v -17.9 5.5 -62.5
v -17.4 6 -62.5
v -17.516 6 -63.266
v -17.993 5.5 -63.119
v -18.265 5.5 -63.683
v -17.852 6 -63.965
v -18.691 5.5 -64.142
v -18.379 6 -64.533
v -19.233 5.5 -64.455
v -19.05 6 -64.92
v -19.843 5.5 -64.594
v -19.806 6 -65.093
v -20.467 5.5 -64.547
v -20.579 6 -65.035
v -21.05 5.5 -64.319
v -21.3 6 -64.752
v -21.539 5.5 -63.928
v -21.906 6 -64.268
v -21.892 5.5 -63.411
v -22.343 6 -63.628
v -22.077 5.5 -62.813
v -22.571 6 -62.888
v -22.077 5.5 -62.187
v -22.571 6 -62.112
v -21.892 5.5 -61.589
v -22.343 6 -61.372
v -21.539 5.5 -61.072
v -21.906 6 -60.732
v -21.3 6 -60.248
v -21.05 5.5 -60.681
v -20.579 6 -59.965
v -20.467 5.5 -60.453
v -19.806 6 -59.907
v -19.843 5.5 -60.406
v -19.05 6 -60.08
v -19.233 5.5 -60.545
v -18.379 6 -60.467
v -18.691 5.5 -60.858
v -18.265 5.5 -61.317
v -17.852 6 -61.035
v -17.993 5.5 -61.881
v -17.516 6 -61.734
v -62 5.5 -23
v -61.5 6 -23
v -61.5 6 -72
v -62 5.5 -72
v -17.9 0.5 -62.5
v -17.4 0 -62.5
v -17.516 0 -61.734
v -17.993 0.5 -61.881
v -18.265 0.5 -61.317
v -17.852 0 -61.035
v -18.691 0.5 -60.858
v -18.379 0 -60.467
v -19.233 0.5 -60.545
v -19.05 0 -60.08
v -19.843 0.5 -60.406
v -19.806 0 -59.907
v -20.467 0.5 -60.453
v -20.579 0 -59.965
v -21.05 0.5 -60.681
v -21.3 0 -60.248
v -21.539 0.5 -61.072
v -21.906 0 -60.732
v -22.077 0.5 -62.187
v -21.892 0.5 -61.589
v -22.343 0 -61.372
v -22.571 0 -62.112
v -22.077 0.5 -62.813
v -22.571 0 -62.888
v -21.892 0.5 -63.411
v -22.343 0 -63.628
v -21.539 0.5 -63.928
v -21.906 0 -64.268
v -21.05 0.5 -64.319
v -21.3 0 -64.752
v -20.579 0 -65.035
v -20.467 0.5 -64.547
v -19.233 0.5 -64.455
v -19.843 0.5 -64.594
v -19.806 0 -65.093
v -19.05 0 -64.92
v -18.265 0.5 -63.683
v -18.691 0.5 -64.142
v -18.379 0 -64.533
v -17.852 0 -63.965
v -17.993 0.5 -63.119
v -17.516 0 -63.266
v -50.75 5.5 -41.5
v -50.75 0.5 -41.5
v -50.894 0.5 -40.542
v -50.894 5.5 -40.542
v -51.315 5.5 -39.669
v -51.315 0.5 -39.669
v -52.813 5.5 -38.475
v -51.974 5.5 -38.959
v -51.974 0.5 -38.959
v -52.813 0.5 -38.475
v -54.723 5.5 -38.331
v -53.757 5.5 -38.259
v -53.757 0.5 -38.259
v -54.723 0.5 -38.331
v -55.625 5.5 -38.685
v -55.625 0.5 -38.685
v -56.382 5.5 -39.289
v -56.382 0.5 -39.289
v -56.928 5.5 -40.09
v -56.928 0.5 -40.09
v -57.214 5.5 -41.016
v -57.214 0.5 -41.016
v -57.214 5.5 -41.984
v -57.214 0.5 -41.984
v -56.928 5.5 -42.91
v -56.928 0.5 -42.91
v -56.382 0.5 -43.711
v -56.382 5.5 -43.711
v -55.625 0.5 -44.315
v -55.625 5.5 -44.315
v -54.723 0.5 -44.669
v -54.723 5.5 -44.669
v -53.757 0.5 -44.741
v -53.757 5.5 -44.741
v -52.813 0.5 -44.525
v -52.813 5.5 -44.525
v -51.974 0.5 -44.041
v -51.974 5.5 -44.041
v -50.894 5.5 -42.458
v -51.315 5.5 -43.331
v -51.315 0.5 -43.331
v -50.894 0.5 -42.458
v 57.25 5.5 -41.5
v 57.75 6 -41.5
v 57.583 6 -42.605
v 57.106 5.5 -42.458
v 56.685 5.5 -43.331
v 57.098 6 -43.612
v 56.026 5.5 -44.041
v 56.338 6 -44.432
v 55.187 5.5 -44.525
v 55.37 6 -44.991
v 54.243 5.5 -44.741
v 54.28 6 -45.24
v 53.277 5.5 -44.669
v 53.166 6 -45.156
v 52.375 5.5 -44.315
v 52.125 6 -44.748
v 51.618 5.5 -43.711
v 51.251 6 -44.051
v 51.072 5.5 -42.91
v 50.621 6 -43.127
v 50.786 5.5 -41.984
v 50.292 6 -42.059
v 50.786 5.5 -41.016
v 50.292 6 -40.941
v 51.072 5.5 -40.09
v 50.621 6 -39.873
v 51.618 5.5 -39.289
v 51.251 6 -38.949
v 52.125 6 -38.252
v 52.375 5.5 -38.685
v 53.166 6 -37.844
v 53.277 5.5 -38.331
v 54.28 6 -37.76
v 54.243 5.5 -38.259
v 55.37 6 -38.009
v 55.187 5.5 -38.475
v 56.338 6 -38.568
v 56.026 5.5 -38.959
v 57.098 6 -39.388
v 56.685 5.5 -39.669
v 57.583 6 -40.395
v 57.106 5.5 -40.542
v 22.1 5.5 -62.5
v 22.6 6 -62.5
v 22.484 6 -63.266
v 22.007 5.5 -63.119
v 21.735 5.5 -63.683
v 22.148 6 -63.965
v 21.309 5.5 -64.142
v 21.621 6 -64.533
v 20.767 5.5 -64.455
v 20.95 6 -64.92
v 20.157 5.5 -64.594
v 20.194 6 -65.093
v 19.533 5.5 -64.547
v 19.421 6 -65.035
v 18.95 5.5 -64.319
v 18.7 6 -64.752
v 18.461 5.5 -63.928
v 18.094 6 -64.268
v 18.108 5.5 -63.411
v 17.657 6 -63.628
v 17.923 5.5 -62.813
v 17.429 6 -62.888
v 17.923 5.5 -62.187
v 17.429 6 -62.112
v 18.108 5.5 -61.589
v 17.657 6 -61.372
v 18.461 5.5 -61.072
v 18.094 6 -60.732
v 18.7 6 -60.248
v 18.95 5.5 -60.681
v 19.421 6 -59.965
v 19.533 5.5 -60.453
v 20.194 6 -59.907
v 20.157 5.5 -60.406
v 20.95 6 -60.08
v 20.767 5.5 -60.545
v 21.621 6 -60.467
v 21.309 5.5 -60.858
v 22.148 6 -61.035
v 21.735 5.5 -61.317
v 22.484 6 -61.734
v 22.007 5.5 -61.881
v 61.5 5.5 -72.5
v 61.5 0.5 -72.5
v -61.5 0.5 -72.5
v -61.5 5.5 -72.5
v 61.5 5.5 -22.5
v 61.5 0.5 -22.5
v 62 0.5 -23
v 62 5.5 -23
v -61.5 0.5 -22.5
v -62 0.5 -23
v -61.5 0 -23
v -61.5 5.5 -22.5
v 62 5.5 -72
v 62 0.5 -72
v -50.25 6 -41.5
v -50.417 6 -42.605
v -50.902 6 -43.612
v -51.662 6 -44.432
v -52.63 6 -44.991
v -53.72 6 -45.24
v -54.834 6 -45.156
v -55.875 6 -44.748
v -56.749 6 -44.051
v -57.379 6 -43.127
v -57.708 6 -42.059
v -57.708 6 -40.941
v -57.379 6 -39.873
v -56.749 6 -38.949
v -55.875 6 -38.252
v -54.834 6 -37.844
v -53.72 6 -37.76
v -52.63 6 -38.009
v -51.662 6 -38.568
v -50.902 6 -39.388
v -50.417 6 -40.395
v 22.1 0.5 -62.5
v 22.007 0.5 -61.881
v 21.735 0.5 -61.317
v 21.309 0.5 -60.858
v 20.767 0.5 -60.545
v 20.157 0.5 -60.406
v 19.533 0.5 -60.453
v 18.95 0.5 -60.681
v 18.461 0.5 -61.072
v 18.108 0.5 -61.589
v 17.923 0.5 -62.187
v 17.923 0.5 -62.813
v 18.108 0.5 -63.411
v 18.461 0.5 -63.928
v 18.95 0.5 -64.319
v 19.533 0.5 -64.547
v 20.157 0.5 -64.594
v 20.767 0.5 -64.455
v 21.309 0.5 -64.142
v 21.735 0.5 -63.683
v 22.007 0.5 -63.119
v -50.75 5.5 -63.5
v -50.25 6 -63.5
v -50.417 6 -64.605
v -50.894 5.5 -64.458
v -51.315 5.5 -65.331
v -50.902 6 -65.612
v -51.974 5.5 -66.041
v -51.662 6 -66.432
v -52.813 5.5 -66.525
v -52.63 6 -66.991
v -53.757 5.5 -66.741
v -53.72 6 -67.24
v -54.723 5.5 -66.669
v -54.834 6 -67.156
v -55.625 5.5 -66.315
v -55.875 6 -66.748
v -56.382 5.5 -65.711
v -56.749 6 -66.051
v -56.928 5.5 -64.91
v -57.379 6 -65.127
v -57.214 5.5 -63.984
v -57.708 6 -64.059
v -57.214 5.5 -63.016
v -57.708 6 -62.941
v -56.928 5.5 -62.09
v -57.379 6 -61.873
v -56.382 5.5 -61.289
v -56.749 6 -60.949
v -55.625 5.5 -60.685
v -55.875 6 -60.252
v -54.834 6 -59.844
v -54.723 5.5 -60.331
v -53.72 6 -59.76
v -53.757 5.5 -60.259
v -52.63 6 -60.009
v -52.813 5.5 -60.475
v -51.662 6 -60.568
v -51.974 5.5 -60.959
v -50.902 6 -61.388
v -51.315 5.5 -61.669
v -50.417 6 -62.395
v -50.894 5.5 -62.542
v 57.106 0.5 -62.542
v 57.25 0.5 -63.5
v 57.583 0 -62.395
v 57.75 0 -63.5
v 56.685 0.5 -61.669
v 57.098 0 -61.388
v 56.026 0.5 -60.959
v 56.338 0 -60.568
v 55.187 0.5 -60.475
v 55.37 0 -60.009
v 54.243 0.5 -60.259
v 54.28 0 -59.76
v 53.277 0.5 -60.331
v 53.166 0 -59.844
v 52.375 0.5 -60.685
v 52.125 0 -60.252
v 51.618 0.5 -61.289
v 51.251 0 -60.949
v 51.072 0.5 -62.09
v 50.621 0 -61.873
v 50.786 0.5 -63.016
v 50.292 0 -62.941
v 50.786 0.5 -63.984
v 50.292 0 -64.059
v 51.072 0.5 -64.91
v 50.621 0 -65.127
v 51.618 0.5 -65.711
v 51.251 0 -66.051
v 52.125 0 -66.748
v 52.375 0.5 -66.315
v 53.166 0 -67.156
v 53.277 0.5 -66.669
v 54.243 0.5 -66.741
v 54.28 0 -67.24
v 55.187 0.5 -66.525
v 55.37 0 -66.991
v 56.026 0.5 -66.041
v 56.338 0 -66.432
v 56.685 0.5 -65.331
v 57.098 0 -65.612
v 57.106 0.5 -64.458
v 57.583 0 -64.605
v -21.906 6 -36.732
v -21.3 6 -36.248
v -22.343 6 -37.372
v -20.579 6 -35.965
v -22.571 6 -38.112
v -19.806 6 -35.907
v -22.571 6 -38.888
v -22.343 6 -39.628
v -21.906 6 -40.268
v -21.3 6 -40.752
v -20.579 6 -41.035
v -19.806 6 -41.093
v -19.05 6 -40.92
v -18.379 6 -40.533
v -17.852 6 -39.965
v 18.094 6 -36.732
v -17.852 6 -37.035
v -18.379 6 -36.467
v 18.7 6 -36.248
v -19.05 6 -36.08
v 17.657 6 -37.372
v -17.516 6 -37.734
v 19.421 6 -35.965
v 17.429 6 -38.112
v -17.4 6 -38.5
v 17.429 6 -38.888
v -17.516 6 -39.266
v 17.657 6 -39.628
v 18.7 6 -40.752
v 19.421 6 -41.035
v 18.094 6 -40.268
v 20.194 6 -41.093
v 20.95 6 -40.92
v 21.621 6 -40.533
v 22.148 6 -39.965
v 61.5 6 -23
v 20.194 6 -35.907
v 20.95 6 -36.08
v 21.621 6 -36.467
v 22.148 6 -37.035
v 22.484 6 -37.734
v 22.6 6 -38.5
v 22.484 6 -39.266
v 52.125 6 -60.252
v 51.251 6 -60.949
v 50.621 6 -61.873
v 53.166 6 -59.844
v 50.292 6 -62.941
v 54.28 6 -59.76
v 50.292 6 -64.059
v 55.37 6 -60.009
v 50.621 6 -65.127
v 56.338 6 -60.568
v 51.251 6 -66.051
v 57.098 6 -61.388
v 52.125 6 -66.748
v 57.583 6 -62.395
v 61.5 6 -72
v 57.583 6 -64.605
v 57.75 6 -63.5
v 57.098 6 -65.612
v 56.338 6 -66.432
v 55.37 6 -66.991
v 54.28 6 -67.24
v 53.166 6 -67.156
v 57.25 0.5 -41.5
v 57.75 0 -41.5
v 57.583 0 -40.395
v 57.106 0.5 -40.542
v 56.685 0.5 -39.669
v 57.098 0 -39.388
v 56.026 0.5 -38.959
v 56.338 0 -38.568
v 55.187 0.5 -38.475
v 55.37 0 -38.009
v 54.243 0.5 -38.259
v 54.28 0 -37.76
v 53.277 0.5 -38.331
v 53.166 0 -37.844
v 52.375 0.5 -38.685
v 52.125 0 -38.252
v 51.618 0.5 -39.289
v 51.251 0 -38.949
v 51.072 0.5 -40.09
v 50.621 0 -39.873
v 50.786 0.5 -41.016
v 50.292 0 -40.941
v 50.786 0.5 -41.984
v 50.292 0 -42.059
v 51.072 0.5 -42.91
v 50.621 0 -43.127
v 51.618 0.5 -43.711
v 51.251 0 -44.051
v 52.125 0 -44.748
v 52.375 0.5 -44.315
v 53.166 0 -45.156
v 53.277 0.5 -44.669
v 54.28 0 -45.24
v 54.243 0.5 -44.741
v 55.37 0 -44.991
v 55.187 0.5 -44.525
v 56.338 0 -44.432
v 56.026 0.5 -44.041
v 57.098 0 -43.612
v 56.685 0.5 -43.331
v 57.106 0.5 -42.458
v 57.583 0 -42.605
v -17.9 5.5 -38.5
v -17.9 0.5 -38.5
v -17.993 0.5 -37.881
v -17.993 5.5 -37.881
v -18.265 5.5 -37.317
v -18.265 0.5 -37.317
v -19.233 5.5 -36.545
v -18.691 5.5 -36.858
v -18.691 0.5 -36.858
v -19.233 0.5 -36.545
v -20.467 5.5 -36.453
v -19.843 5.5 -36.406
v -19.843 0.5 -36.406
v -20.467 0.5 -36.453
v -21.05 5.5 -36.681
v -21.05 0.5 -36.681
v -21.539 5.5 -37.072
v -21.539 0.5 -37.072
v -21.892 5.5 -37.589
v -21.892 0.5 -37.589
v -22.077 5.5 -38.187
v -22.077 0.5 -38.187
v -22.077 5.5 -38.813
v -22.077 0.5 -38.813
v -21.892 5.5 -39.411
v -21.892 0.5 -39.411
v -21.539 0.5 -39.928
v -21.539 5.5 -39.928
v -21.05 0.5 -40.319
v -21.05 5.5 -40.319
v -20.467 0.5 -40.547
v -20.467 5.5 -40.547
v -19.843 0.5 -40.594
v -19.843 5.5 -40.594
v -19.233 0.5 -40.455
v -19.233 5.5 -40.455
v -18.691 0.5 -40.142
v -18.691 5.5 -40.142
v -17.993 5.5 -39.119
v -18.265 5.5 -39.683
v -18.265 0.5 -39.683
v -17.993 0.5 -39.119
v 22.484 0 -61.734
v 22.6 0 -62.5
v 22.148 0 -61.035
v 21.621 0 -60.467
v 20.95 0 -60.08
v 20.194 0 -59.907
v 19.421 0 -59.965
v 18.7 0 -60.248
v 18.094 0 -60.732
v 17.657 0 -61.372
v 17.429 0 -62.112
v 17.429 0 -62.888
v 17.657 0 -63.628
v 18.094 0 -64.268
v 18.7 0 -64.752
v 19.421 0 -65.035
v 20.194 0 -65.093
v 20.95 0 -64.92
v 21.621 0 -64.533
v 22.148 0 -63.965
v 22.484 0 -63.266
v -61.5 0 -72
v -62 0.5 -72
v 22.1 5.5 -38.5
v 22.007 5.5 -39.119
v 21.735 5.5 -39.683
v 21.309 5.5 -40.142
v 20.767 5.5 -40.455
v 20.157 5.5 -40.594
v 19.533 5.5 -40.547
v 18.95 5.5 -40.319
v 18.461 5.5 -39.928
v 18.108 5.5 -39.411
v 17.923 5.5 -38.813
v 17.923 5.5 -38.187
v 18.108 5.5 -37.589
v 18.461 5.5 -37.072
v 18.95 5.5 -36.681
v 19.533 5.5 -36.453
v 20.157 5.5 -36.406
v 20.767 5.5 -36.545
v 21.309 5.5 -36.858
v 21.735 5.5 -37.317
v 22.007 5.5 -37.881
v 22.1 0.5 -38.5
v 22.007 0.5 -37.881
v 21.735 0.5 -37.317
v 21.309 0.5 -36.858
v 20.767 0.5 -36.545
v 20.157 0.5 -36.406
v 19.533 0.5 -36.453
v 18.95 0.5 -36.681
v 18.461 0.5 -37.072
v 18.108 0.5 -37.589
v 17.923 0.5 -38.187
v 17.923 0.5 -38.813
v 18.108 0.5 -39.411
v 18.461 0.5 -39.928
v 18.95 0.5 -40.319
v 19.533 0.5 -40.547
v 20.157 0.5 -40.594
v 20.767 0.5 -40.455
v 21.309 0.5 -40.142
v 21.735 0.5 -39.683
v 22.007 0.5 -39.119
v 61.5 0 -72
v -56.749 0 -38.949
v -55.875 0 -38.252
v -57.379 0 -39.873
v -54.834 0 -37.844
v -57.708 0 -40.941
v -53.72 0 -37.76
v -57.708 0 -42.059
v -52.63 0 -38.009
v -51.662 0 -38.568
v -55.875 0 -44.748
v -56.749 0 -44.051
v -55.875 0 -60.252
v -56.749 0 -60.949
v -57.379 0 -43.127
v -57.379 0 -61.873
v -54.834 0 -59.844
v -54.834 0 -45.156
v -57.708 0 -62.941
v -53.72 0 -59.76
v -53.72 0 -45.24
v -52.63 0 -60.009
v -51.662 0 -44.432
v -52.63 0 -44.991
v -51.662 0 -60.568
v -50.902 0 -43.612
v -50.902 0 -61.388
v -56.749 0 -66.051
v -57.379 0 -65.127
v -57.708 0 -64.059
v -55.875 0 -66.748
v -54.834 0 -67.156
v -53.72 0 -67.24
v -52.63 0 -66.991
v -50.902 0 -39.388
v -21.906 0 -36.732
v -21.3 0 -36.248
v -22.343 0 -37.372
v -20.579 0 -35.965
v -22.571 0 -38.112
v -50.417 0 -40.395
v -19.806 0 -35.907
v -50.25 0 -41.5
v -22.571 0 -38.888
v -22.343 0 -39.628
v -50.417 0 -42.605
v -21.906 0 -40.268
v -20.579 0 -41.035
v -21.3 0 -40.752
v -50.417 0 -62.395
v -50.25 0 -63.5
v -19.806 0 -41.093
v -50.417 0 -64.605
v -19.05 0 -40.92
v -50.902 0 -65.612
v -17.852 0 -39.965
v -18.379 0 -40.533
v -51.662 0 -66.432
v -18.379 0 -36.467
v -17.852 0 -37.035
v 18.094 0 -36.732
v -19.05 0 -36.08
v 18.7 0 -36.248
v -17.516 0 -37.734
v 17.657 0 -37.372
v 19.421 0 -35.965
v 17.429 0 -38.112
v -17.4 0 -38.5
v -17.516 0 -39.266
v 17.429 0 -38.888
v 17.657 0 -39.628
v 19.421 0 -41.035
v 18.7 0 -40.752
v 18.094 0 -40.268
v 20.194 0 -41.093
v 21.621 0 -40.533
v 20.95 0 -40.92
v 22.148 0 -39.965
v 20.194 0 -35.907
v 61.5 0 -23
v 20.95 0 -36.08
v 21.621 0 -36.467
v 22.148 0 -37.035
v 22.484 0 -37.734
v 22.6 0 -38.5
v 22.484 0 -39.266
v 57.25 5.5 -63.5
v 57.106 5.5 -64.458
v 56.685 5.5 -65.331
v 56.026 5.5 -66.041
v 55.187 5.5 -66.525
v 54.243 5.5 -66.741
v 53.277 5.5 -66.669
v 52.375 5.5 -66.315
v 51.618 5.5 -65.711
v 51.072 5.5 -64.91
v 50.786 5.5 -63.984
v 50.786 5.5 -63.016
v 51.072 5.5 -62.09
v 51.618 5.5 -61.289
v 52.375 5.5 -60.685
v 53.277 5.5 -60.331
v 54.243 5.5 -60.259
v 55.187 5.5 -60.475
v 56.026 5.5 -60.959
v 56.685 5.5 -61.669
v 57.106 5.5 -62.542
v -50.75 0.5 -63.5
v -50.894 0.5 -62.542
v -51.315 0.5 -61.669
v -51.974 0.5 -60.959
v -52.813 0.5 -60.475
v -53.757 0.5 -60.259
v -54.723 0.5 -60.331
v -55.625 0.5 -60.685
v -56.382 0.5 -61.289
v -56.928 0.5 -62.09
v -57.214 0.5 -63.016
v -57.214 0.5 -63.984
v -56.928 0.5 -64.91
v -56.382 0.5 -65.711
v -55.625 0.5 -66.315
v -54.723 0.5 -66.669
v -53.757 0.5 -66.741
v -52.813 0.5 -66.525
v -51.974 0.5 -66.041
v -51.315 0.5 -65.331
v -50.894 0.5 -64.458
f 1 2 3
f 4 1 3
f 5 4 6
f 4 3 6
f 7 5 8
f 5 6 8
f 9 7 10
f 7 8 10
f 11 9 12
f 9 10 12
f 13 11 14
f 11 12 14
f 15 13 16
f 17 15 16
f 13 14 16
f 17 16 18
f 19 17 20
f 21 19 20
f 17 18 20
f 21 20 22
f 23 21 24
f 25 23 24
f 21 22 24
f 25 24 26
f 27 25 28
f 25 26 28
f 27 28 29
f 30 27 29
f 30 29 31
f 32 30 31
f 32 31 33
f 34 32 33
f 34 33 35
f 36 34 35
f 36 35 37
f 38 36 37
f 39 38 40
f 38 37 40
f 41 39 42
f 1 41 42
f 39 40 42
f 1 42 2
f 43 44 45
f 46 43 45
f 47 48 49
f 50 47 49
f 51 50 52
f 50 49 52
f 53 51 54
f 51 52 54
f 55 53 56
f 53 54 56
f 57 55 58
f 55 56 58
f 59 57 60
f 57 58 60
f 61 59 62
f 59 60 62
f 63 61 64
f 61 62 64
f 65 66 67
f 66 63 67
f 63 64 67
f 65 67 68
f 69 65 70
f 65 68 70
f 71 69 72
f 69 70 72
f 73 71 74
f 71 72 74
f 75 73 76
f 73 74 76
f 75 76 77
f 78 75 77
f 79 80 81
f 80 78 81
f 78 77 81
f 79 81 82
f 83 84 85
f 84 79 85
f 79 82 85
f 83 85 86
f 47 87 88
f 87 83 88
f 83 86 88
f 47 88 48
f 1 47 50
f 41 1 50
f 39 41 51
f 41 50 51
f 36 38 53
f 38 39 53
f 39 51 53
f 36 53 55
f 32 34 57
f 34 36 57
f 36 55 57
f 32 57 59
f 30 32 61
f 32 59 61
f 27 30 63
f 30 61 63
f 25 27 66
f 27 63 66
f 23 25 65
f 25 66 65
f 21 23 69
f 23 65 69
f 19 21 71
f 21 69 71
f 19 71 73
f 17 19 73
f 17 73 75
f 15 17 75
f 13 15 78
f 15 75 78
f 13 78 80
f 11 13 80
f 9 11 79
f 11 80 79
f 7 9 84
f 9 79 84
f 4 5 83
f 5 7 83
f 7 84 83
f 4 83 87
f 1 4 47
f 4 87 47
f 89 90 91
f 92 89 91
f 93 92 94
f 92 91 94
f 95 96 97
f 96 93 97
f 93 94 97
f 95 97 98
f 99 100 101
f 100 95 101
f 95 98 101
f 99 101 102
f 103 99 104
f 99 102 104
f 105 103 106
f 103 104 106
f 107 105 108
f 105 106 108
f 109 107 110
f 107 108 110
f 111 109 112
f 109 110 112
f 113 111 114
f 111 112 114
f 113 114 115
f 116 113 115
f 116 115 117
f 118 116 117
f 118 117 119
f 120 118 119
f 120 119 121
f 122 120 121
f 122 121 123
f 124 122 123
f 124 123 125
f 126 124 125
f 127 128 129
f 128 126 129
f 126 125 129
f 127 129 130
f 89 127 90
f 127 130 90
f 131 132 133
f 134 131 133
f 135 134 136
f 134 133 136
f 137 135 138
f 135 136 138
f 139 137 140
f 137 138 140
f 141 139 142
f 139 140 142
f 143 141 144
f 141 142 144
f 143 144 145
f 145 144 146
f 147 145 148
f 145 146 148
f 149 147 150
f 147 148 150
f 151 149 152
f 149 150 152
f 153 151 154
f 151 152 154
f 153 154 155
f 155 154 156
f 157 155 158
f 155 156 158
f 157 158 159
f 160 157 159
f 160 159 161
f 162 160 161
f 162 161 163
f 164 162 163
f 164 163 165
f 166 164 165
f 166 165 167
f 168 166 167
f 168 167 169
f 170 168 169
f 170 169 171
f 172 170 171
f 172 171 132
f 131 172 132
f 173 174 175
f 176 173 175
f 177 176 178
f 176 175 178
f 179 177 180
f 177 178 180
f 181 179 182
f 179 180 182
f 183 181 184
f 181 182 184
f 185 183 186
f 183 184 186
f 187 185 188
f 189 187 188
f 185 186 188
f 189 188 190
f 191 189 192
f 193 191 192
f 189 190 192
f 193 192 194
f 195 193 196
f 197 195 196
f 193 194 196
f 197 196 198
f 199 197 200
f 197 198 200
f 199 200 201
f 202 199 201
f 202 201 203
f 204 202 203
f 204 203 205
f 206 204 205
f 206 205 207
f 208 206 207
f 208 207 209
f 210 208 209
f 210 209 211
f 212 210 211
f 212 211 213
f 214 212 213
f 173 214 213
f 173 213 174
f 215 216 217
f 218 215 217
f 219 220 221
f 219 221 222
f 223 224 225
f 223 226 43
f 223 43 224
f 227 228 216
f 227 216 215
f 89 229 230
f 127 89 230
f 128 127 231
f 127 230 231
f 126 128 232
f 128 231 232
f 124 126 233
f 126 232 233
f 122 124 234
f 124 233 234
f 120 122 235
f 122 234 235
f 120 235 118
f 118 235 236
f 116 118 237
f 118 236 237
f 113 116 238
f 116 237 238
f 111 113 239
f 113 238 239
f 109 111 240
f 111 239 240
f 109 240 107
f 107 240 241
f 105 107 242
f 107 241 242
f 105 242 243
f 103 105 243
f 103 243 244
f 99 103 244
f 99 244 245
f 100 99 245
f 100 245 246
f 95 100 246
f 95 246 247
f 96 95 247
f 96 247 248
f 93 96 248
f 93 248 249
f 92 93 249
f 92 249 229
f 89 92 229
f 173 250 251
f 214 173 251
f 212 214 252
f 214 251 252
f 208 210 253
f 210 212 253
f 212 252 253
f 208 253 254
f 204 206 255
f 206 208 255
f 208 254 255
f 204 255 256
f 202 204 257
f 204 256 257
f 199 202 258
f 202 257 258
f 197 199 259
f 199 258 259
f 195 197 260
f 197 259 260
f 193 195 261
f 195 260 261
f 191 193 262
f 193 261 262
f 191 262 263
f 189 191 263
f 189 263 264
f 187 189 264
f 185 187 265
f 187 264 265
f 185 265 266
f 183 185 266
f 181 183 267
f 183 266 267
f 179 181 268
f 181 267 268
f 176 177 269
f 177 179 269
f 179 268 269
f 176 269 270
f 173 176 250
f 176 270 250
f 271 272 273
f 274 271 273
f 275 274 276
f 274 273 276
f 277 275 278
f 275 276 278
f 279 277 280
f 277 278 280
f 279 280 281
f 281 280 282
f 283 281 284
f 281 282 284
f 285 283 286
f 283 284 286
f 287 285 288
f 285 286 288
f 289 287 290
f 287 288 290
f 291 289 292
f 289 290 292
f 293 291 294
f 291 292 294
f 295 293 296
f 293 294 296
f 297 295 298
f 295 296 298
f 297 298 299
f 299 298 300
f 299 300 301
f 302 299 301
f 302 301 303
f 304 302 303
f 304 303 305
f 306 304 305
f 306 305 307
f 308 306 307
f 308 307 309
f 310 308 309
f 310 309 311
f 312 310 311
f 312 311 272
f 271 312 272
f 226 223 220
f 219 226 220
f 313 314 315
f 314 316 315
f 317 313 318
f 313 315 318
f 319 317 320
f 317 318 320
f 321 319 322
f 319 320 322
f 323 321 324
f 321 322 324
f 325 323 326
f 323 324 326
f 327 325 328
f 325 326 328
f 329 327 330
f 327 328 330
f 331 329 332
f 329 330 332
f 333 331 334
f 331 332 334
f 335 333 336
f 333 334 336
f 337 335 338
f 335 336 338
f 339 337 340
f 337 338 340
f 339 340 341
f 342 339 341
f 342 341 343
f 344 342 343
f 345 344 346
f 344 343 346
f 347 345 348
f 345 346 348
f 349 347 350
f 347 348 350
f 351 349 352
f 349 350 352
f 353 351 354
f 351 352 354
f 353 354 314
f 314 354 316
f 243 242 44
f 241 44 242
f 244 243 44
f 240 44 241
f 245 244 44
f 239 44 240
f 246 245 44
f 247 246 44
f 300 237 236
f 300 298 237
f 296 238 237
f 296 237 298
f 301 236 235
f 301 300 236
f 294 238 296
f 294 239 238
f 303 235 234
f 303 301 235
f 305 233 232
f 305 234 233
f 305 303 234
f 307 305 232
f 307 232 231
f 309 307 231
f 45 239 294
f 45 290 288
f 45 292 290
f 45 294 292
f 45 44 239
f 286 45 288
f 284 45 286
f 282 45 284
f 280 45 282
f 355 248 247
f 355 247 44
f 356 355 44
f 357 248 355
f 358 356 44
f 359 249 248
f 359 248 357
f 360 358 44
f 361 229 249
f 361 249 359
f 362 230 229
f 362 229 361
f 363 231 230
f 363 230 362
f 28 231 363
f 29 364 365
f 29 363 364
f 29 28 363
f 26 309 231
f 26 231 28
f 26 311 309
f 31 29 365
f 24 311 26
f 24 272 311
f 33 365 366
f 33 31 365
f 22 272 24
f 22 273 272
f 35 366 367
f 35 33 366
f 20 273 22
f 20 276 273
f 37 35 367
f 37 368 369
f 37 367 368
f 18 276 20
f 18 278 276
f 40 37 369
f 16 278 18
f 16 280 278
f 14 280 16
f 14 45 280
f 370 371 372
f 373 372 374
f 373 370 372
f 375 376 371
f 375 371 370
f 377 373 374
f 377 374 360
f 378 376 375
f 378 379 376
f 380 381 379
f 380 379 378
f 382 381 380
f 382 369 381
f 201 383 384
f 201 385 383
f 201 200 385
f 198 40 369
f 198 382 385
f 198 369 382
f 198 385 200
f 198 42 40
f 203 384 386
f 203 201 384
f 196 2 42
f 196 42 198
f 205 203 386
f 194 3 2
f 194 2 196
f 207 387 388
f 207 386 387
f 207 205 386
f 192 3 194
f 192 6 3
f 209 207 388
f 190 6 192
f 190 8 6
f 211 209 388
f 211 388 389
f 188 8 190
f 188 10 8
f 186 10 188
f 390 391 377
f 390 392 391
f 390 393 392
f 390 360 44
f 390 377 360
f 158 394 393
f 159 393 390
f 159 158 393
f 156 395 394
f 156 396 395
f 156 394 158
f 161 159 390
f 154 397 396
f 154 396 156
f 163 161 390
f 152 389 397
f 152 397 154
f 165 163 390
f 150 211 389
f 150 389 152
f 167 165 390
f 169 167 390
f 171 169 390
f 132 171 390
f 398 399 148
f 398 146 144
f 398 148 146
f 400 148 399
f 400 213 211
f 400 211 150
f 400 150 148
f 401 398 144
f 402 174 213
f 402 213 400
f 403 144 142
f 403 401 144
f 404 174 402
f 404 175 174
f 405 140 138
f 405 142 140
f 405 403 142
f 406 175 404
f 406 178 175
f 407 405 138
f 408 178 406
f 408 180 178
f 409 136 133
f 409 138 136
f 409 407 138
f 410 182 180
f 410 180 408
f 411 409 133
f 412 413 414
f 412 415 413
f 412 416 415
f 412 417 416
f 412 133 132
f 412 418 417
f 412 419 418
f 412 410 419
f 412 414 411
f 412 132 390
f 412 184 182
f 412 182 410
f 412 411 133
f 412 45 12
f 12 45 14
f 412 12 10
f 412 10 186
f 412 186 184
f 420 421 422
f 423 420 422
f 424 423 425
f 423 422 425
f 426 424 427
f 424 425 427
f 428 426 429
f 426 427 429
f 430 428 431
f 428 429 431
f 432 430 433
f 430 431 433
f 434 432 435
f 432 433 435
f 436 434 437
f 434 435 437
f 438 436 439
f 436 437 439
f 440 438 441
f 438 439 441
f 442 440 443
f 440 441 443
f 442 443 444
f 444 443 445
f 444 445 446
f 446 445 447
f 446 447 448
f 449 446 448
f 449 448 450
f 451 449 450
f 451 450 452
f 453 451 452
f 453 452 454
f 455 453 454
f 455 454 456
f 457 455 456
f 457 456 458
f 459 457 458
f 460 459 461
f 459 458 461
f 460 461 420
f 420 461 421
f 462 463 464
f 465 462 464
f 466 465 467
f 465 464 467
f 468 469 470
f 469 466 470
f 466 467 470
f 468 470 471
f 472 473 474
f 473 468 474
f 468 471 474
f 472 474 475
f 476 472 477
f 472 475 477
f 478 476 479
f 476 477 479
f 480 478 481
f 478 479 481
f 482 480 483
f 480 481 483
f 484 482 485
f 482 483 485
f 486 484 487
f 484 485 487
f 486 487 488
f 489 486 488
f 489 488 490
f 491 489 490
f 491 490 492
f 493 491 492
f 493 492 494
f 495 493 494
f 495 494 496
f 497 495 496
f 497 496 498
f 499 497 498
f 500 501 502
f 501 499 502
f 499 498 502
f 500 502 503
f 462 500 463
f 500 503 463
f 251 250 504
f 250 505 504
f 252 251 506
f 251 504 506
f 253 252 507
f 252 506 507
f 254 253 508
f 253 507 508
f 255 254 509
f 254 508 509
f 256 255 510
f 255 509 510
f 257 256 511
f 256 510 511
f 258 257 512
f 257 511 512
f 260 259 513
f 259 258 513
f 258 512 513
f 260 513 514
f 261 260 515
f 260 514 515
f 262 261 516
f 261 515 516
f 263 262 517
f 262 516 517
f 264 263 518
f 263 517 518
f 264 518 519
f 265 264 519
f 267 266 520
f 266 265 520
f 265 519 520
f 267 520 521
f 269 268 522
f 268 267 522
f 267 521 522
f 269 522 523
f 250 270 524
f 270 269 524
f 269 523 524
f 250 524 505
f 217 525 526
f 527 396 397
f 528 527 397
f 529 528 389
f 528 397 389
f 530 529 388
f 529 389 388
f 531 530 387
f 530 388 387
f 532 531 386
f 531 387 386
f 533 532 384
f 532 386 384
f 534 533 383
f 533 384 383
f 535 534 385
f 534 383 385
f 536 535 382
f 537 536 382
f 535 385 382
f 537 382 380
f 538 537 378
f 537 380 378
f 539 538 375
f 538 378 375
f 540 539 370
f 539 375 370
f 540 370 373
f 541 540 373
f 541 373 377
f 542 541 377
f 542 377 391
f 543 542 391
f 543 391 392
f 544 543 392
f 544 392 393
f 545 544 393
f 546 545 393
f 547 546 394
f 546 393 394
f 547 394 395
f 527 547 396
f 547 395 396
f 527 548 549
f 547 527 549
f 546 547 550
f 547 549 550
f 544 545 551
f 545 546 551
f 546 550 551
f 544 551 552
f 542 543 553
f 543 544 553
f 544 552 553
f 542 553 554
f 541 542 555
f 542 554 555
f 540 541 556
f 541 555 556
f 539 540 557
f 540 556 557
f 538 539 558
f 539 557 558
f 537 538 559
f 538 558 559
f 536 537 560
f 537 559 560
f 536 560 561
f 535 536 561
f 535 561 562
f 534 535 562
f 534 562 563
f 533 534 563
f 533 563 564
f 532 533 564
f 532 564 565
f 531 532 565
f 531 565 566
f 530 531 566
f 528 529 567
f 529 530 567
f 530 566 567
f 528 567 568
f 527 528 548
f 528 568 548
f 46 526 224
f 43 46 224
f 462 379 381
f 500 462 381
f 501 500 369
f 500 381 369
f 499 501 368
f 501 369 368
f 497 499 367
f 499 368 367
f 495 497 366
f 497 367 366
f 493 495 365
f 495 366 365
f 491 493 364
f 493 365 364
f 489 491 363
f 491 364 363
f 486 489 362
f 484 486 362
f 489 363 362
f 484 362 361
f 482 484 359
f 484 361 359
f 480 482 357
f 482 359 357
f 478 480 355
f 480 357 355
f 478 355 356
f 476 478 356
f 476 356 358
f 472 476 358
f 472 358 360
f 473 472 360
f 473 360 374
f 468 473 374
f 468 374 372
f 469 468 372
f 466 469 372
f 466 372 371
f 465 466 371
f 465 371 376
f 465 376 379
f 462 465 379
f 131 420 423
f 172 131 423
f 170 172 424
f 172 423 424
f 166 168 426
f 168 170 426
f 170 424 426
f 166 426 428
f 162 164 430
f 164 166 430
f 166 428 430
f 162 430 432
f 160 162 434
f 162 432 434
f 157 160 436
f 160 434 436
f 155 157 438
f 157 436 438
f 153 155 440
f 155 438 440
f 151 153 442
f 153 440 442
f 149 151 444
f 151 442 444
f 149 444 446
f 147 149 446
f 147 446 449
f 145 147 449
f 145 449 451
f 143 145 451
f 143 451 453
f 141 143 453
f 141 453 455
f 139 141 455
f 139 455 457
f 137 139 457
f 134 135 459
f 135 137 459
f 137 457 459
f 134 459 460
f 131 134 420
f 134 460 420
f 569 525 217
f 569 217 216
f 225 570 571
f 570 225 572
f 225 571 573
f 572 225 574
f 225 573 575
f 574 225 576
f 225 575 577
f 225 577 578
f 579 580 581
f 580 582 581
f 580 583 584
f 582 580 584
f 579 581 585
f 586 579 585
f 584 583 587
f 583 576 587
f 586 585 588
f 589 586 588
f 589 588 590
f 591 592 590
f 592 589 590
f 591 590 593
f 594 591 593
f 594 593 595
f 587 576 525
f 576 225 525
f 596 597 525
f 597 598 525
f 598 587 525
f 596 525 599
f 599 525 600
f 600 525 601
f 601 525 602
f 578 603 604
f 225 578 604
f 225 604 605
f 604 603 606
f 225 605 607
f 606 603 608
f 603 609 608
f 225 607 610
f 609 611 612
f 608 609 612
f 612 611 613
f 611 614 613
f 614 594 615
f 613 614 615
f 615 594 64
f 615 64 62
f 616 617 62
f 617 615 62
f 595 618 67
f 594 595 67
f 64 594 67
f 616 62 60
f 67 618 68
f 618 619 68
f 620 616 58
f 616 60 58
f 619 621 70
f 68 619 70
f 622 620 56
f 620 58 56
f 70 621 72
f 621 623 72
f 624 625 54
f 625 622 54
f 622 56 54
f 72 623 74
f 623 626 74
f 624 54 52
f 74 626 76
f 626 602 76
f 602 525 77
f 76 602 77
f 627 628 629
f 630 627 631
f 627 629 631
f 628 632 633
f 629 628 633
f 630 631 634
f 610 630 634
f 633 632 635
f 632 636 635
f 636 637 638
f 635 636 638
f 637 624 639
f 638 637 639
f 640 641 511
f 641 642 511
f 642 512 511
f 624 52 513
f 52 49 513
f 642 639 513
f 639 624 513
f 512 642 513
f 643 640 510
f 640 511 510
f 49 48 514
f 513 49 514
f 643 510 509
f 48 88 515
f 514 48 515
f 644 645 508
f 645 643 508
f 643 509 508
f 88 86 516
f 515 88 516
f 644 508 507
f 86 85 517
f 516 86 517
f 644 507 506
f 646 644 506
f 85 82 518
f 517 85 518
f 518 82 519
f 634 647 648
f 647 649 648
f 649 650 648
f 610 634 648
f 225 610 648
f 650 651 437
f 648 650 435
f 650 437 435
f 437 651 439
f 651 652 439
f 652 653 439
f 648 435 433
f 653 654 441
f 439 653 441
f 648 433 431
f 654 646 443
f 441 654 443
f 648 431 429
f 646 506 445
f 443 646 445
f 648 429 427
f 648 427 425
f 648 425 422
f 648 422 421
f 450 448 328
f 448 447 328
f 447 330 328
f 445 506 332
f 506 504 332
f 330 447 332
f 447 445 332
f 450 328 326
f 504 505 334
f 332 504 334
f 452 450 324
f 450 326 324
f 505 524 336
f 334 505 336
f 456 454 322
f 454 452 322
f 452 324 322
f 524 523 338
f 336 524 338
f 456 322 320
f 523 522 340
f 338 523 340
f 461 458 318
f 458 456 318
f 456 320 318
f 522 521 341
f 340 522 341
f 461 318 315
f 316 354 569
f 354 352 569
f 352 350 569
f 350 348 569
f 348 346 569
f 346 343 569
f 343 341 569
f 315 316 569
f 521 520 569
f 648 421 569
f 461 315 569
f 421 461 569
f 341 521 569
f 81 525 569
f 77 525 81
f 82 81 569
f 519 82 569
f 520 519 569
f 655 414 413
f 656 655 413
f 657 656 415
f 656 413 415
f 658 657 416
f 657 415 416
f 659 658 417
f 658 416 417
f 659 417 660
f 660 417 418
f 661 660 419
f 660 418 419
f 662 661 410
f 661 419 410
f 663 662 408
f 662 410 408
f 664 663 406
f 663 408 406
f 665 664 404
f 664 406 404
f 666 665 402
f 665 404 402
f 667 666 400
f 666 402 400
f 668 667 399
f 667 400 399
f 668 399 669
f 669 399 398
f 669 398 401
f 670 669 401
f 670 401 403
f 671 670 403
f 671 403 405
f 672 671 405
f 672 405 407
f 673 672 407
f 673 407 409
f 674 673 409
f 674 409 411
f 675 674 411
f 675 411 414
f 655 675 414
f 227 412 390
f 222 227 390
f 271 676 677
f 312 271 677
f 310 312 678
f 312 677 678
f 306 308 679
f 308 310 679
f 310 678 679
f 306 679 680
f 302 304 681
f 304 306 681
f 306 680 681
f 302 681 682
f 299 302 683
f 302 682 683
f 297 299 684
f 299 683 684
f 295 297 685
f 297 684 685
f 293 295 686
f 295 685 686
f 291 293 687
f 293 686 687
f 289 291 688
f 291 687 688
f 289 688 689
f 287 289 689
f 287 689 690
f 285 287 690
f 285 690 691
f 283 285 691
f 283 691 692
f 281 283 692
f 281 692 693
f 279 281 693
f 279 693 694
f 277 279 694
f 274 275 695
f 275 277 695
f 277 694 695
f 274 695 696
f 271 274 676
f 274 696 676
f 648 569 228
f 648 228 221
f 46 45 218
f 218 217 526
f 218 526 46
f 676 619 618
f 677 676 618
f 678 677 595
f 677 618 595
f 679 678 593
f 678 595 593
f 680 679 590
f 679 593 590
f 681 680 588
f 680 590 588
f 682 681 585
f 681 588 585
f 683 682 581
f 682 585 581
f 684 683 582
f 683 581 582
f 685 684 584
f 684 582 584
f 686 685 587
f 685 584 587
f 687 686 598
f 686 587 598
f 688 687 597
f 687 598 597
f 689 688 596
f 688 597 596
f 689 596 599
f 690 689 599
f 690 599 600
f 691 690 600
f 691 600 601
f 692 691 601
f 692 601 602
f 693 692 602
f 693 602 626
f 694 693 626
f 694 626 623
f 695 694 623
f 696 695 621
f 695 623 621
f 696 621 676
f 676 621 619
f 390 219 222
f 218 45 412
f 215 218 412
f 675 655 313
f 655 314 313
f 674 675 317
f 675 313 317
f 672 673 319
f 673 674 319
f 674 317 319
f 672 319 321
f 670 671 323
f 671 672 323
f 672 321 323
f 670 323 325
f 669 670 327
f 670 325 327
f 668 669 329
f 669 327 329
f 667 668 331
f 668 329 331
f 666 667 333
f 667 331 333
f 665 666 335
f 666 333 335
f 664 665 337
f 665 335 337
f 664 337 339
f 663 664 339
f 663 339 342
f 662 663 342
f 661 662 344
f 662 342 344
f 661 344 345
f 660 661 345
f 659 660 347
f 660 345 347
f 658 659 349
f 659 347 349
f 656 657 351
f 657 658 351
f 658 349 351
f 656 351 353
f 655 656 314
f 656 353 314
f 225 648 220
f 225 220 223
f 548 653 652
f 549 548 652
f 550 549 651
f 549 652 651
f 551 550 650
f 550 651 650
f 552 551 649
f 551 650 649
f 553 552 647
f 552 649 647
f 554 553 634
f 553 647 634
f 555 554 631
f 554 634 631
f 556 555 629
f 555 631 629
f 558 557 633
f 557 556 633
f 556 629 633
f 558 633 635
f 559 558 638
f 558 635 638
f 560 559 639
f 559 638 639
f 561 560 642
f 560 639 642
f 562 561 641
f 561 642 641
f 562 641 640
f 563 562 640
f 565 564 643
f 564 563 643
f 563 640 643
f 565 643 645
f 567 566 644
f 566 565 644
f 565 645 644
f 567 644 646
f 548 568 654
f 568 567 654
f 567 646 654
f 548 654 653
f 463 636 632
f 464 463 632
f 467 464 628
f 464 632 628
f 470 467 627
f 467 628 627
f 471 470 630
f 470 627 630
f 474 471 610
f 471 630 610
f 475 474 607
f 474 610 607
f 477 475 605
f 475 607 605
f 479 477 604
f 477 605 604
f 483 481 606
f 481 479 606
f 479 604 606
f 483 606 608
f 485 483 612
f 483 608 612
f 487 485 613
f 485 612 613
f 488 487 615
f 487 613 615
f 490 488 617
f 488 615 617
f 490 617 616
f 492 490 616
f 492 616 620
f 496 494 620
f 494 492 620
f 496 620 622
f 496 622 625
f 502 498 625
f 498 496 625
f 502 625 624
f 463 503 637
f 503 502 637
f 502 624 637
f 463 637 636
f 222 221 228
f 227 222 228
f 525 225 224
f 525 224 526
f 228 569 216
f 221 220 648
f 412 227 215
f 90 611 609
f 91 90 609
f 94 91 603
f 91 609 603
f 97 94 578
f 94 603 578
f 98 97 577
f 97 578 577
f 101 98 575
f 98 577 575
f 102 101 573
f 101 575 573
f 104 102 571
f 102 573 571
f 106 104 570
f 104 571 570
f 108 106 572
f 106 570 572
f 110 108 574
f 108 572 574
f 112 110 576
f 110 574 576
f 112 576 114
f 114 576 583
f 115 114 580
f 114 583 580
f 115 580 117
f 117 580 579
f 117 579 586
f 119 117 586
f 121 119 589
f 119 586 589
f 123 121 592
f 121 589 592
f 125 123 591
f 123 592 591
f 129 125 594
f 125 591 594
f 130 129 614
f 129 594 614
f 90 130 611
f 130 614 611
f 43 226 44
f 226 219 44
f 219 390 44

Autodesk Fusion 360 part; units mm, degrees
sketch "Plate" plane through (0, 0, 0) normal (0, 1, 0) x (1, 0, 0)
  line L0 (-54, 41.5) -> (54, 41.5) construction
  circle A0 centre (-54, 41.5) radius 3.25
  circle A1 centre (-20, 62.5) radius 2.1
  circle A2 centre (-54, 63.5) radius 3.25
  circle A3 centre (-20, 38.5) radius 2.1
  line L1 (20, 62.5) -> (-20, 62.5) construction
  line L2 (-20, 38.5) -> (20, 38.5) construction
  line L3 (-20, 62.5) -> (-20, 38.5) construction
  line L4 (54, 41.5) -> (54, 63.5) construction
  line L5 (20, 38.5) -> (20, 62.5) construction
  line L6 (54, 63.5) -> (-54, 63.5) construction
  circle A4 centre (54, 63.5) radius 3.25
  circle A5 centre (20, 38.5) radius 2.1
  circle A6 centre (20, 62.5) radius 2.1
  circle A7 centre (54, 41.5) radius 3.25
  line L7 (-54, 63.5) -> (-54, 41.5) construction
  line L8 (-62, 22.5) -> (62, 22.5)
  line L9 (62, 22.5) -> (62, 72.5)
  line L10 (62, 72.5) -> (-62, 72.5)
  line L11 (-62, 72.5) -> (-62, 22.5)
  point P0 (-54.1427, 52.5)
  dimension "d1" = 108
  dimension "d2" = 22
  dimension "d3" = 6.5
  dimension "d4" = 6.5
  dimension "d5" = 6.5
  dimension "d6" = 6.5
  dimension "d7" = 40
  dimension "d8" = 24
  dimension "d9" = 3
  dimension "d10" = 4.2
  dimension "d11" = 4.2
  dimension "d12" = 4.2
  dimension "d13" = 4.2
  dimension "d14" = 124
  dimension "d15" = 50
  dimension "d16" = 8
  dimension "d17" = 7.5
  dimension "d18" = 10
extrude "Extrude1" add sketch "Plate" along normal blind 6 makes body 1
copy_body "Body->Comp1" bodies 1 removing the originals makes body 2 in component "Plate"
chamfer "Chamfer1" distance 0.5 angle 45 28 edges at (-62, 0, -47.5) (-62, 3, -22.5) (0, 0, -22.5) (0, 6, -22.5) (62, 3, -22.5) (62, 0, -47.5) (62, 6, -47.5) (0, 0, -72.5) (62, 3, -72.5) (0, 6, -72.5) (-62, 6, -47.5) (-62, 3, -72.5) (-57.0301, 6, -64.6753) (-57.0301, 6, -42.6753) (-21.9579, 6, -39.2594) (-21.9579, 6, -63.2594) (18.0421, 6, -39.2594) (18.0421, 6, -63.2594) (50.9699, 6, -42.6753) (50.9699, 6, -64.6753) (-57.0301, 0, -64.6753) (-57.0301, 0, -42.6753) (-21.9579, 0, -39.2594) (-21.9579, 0, -63.2594) (18.0421, 0, -39.2594) (18.0421, 0, -63.2594) (50.9699, 0, -42.6753) (50.9699, 0, -64.6753) on bodies 2 in component "Plate"
component "Plate" placed x (1, 0, 0) y (0, 1, 0) z (0, 0, 1) at (0, 0, 0)
